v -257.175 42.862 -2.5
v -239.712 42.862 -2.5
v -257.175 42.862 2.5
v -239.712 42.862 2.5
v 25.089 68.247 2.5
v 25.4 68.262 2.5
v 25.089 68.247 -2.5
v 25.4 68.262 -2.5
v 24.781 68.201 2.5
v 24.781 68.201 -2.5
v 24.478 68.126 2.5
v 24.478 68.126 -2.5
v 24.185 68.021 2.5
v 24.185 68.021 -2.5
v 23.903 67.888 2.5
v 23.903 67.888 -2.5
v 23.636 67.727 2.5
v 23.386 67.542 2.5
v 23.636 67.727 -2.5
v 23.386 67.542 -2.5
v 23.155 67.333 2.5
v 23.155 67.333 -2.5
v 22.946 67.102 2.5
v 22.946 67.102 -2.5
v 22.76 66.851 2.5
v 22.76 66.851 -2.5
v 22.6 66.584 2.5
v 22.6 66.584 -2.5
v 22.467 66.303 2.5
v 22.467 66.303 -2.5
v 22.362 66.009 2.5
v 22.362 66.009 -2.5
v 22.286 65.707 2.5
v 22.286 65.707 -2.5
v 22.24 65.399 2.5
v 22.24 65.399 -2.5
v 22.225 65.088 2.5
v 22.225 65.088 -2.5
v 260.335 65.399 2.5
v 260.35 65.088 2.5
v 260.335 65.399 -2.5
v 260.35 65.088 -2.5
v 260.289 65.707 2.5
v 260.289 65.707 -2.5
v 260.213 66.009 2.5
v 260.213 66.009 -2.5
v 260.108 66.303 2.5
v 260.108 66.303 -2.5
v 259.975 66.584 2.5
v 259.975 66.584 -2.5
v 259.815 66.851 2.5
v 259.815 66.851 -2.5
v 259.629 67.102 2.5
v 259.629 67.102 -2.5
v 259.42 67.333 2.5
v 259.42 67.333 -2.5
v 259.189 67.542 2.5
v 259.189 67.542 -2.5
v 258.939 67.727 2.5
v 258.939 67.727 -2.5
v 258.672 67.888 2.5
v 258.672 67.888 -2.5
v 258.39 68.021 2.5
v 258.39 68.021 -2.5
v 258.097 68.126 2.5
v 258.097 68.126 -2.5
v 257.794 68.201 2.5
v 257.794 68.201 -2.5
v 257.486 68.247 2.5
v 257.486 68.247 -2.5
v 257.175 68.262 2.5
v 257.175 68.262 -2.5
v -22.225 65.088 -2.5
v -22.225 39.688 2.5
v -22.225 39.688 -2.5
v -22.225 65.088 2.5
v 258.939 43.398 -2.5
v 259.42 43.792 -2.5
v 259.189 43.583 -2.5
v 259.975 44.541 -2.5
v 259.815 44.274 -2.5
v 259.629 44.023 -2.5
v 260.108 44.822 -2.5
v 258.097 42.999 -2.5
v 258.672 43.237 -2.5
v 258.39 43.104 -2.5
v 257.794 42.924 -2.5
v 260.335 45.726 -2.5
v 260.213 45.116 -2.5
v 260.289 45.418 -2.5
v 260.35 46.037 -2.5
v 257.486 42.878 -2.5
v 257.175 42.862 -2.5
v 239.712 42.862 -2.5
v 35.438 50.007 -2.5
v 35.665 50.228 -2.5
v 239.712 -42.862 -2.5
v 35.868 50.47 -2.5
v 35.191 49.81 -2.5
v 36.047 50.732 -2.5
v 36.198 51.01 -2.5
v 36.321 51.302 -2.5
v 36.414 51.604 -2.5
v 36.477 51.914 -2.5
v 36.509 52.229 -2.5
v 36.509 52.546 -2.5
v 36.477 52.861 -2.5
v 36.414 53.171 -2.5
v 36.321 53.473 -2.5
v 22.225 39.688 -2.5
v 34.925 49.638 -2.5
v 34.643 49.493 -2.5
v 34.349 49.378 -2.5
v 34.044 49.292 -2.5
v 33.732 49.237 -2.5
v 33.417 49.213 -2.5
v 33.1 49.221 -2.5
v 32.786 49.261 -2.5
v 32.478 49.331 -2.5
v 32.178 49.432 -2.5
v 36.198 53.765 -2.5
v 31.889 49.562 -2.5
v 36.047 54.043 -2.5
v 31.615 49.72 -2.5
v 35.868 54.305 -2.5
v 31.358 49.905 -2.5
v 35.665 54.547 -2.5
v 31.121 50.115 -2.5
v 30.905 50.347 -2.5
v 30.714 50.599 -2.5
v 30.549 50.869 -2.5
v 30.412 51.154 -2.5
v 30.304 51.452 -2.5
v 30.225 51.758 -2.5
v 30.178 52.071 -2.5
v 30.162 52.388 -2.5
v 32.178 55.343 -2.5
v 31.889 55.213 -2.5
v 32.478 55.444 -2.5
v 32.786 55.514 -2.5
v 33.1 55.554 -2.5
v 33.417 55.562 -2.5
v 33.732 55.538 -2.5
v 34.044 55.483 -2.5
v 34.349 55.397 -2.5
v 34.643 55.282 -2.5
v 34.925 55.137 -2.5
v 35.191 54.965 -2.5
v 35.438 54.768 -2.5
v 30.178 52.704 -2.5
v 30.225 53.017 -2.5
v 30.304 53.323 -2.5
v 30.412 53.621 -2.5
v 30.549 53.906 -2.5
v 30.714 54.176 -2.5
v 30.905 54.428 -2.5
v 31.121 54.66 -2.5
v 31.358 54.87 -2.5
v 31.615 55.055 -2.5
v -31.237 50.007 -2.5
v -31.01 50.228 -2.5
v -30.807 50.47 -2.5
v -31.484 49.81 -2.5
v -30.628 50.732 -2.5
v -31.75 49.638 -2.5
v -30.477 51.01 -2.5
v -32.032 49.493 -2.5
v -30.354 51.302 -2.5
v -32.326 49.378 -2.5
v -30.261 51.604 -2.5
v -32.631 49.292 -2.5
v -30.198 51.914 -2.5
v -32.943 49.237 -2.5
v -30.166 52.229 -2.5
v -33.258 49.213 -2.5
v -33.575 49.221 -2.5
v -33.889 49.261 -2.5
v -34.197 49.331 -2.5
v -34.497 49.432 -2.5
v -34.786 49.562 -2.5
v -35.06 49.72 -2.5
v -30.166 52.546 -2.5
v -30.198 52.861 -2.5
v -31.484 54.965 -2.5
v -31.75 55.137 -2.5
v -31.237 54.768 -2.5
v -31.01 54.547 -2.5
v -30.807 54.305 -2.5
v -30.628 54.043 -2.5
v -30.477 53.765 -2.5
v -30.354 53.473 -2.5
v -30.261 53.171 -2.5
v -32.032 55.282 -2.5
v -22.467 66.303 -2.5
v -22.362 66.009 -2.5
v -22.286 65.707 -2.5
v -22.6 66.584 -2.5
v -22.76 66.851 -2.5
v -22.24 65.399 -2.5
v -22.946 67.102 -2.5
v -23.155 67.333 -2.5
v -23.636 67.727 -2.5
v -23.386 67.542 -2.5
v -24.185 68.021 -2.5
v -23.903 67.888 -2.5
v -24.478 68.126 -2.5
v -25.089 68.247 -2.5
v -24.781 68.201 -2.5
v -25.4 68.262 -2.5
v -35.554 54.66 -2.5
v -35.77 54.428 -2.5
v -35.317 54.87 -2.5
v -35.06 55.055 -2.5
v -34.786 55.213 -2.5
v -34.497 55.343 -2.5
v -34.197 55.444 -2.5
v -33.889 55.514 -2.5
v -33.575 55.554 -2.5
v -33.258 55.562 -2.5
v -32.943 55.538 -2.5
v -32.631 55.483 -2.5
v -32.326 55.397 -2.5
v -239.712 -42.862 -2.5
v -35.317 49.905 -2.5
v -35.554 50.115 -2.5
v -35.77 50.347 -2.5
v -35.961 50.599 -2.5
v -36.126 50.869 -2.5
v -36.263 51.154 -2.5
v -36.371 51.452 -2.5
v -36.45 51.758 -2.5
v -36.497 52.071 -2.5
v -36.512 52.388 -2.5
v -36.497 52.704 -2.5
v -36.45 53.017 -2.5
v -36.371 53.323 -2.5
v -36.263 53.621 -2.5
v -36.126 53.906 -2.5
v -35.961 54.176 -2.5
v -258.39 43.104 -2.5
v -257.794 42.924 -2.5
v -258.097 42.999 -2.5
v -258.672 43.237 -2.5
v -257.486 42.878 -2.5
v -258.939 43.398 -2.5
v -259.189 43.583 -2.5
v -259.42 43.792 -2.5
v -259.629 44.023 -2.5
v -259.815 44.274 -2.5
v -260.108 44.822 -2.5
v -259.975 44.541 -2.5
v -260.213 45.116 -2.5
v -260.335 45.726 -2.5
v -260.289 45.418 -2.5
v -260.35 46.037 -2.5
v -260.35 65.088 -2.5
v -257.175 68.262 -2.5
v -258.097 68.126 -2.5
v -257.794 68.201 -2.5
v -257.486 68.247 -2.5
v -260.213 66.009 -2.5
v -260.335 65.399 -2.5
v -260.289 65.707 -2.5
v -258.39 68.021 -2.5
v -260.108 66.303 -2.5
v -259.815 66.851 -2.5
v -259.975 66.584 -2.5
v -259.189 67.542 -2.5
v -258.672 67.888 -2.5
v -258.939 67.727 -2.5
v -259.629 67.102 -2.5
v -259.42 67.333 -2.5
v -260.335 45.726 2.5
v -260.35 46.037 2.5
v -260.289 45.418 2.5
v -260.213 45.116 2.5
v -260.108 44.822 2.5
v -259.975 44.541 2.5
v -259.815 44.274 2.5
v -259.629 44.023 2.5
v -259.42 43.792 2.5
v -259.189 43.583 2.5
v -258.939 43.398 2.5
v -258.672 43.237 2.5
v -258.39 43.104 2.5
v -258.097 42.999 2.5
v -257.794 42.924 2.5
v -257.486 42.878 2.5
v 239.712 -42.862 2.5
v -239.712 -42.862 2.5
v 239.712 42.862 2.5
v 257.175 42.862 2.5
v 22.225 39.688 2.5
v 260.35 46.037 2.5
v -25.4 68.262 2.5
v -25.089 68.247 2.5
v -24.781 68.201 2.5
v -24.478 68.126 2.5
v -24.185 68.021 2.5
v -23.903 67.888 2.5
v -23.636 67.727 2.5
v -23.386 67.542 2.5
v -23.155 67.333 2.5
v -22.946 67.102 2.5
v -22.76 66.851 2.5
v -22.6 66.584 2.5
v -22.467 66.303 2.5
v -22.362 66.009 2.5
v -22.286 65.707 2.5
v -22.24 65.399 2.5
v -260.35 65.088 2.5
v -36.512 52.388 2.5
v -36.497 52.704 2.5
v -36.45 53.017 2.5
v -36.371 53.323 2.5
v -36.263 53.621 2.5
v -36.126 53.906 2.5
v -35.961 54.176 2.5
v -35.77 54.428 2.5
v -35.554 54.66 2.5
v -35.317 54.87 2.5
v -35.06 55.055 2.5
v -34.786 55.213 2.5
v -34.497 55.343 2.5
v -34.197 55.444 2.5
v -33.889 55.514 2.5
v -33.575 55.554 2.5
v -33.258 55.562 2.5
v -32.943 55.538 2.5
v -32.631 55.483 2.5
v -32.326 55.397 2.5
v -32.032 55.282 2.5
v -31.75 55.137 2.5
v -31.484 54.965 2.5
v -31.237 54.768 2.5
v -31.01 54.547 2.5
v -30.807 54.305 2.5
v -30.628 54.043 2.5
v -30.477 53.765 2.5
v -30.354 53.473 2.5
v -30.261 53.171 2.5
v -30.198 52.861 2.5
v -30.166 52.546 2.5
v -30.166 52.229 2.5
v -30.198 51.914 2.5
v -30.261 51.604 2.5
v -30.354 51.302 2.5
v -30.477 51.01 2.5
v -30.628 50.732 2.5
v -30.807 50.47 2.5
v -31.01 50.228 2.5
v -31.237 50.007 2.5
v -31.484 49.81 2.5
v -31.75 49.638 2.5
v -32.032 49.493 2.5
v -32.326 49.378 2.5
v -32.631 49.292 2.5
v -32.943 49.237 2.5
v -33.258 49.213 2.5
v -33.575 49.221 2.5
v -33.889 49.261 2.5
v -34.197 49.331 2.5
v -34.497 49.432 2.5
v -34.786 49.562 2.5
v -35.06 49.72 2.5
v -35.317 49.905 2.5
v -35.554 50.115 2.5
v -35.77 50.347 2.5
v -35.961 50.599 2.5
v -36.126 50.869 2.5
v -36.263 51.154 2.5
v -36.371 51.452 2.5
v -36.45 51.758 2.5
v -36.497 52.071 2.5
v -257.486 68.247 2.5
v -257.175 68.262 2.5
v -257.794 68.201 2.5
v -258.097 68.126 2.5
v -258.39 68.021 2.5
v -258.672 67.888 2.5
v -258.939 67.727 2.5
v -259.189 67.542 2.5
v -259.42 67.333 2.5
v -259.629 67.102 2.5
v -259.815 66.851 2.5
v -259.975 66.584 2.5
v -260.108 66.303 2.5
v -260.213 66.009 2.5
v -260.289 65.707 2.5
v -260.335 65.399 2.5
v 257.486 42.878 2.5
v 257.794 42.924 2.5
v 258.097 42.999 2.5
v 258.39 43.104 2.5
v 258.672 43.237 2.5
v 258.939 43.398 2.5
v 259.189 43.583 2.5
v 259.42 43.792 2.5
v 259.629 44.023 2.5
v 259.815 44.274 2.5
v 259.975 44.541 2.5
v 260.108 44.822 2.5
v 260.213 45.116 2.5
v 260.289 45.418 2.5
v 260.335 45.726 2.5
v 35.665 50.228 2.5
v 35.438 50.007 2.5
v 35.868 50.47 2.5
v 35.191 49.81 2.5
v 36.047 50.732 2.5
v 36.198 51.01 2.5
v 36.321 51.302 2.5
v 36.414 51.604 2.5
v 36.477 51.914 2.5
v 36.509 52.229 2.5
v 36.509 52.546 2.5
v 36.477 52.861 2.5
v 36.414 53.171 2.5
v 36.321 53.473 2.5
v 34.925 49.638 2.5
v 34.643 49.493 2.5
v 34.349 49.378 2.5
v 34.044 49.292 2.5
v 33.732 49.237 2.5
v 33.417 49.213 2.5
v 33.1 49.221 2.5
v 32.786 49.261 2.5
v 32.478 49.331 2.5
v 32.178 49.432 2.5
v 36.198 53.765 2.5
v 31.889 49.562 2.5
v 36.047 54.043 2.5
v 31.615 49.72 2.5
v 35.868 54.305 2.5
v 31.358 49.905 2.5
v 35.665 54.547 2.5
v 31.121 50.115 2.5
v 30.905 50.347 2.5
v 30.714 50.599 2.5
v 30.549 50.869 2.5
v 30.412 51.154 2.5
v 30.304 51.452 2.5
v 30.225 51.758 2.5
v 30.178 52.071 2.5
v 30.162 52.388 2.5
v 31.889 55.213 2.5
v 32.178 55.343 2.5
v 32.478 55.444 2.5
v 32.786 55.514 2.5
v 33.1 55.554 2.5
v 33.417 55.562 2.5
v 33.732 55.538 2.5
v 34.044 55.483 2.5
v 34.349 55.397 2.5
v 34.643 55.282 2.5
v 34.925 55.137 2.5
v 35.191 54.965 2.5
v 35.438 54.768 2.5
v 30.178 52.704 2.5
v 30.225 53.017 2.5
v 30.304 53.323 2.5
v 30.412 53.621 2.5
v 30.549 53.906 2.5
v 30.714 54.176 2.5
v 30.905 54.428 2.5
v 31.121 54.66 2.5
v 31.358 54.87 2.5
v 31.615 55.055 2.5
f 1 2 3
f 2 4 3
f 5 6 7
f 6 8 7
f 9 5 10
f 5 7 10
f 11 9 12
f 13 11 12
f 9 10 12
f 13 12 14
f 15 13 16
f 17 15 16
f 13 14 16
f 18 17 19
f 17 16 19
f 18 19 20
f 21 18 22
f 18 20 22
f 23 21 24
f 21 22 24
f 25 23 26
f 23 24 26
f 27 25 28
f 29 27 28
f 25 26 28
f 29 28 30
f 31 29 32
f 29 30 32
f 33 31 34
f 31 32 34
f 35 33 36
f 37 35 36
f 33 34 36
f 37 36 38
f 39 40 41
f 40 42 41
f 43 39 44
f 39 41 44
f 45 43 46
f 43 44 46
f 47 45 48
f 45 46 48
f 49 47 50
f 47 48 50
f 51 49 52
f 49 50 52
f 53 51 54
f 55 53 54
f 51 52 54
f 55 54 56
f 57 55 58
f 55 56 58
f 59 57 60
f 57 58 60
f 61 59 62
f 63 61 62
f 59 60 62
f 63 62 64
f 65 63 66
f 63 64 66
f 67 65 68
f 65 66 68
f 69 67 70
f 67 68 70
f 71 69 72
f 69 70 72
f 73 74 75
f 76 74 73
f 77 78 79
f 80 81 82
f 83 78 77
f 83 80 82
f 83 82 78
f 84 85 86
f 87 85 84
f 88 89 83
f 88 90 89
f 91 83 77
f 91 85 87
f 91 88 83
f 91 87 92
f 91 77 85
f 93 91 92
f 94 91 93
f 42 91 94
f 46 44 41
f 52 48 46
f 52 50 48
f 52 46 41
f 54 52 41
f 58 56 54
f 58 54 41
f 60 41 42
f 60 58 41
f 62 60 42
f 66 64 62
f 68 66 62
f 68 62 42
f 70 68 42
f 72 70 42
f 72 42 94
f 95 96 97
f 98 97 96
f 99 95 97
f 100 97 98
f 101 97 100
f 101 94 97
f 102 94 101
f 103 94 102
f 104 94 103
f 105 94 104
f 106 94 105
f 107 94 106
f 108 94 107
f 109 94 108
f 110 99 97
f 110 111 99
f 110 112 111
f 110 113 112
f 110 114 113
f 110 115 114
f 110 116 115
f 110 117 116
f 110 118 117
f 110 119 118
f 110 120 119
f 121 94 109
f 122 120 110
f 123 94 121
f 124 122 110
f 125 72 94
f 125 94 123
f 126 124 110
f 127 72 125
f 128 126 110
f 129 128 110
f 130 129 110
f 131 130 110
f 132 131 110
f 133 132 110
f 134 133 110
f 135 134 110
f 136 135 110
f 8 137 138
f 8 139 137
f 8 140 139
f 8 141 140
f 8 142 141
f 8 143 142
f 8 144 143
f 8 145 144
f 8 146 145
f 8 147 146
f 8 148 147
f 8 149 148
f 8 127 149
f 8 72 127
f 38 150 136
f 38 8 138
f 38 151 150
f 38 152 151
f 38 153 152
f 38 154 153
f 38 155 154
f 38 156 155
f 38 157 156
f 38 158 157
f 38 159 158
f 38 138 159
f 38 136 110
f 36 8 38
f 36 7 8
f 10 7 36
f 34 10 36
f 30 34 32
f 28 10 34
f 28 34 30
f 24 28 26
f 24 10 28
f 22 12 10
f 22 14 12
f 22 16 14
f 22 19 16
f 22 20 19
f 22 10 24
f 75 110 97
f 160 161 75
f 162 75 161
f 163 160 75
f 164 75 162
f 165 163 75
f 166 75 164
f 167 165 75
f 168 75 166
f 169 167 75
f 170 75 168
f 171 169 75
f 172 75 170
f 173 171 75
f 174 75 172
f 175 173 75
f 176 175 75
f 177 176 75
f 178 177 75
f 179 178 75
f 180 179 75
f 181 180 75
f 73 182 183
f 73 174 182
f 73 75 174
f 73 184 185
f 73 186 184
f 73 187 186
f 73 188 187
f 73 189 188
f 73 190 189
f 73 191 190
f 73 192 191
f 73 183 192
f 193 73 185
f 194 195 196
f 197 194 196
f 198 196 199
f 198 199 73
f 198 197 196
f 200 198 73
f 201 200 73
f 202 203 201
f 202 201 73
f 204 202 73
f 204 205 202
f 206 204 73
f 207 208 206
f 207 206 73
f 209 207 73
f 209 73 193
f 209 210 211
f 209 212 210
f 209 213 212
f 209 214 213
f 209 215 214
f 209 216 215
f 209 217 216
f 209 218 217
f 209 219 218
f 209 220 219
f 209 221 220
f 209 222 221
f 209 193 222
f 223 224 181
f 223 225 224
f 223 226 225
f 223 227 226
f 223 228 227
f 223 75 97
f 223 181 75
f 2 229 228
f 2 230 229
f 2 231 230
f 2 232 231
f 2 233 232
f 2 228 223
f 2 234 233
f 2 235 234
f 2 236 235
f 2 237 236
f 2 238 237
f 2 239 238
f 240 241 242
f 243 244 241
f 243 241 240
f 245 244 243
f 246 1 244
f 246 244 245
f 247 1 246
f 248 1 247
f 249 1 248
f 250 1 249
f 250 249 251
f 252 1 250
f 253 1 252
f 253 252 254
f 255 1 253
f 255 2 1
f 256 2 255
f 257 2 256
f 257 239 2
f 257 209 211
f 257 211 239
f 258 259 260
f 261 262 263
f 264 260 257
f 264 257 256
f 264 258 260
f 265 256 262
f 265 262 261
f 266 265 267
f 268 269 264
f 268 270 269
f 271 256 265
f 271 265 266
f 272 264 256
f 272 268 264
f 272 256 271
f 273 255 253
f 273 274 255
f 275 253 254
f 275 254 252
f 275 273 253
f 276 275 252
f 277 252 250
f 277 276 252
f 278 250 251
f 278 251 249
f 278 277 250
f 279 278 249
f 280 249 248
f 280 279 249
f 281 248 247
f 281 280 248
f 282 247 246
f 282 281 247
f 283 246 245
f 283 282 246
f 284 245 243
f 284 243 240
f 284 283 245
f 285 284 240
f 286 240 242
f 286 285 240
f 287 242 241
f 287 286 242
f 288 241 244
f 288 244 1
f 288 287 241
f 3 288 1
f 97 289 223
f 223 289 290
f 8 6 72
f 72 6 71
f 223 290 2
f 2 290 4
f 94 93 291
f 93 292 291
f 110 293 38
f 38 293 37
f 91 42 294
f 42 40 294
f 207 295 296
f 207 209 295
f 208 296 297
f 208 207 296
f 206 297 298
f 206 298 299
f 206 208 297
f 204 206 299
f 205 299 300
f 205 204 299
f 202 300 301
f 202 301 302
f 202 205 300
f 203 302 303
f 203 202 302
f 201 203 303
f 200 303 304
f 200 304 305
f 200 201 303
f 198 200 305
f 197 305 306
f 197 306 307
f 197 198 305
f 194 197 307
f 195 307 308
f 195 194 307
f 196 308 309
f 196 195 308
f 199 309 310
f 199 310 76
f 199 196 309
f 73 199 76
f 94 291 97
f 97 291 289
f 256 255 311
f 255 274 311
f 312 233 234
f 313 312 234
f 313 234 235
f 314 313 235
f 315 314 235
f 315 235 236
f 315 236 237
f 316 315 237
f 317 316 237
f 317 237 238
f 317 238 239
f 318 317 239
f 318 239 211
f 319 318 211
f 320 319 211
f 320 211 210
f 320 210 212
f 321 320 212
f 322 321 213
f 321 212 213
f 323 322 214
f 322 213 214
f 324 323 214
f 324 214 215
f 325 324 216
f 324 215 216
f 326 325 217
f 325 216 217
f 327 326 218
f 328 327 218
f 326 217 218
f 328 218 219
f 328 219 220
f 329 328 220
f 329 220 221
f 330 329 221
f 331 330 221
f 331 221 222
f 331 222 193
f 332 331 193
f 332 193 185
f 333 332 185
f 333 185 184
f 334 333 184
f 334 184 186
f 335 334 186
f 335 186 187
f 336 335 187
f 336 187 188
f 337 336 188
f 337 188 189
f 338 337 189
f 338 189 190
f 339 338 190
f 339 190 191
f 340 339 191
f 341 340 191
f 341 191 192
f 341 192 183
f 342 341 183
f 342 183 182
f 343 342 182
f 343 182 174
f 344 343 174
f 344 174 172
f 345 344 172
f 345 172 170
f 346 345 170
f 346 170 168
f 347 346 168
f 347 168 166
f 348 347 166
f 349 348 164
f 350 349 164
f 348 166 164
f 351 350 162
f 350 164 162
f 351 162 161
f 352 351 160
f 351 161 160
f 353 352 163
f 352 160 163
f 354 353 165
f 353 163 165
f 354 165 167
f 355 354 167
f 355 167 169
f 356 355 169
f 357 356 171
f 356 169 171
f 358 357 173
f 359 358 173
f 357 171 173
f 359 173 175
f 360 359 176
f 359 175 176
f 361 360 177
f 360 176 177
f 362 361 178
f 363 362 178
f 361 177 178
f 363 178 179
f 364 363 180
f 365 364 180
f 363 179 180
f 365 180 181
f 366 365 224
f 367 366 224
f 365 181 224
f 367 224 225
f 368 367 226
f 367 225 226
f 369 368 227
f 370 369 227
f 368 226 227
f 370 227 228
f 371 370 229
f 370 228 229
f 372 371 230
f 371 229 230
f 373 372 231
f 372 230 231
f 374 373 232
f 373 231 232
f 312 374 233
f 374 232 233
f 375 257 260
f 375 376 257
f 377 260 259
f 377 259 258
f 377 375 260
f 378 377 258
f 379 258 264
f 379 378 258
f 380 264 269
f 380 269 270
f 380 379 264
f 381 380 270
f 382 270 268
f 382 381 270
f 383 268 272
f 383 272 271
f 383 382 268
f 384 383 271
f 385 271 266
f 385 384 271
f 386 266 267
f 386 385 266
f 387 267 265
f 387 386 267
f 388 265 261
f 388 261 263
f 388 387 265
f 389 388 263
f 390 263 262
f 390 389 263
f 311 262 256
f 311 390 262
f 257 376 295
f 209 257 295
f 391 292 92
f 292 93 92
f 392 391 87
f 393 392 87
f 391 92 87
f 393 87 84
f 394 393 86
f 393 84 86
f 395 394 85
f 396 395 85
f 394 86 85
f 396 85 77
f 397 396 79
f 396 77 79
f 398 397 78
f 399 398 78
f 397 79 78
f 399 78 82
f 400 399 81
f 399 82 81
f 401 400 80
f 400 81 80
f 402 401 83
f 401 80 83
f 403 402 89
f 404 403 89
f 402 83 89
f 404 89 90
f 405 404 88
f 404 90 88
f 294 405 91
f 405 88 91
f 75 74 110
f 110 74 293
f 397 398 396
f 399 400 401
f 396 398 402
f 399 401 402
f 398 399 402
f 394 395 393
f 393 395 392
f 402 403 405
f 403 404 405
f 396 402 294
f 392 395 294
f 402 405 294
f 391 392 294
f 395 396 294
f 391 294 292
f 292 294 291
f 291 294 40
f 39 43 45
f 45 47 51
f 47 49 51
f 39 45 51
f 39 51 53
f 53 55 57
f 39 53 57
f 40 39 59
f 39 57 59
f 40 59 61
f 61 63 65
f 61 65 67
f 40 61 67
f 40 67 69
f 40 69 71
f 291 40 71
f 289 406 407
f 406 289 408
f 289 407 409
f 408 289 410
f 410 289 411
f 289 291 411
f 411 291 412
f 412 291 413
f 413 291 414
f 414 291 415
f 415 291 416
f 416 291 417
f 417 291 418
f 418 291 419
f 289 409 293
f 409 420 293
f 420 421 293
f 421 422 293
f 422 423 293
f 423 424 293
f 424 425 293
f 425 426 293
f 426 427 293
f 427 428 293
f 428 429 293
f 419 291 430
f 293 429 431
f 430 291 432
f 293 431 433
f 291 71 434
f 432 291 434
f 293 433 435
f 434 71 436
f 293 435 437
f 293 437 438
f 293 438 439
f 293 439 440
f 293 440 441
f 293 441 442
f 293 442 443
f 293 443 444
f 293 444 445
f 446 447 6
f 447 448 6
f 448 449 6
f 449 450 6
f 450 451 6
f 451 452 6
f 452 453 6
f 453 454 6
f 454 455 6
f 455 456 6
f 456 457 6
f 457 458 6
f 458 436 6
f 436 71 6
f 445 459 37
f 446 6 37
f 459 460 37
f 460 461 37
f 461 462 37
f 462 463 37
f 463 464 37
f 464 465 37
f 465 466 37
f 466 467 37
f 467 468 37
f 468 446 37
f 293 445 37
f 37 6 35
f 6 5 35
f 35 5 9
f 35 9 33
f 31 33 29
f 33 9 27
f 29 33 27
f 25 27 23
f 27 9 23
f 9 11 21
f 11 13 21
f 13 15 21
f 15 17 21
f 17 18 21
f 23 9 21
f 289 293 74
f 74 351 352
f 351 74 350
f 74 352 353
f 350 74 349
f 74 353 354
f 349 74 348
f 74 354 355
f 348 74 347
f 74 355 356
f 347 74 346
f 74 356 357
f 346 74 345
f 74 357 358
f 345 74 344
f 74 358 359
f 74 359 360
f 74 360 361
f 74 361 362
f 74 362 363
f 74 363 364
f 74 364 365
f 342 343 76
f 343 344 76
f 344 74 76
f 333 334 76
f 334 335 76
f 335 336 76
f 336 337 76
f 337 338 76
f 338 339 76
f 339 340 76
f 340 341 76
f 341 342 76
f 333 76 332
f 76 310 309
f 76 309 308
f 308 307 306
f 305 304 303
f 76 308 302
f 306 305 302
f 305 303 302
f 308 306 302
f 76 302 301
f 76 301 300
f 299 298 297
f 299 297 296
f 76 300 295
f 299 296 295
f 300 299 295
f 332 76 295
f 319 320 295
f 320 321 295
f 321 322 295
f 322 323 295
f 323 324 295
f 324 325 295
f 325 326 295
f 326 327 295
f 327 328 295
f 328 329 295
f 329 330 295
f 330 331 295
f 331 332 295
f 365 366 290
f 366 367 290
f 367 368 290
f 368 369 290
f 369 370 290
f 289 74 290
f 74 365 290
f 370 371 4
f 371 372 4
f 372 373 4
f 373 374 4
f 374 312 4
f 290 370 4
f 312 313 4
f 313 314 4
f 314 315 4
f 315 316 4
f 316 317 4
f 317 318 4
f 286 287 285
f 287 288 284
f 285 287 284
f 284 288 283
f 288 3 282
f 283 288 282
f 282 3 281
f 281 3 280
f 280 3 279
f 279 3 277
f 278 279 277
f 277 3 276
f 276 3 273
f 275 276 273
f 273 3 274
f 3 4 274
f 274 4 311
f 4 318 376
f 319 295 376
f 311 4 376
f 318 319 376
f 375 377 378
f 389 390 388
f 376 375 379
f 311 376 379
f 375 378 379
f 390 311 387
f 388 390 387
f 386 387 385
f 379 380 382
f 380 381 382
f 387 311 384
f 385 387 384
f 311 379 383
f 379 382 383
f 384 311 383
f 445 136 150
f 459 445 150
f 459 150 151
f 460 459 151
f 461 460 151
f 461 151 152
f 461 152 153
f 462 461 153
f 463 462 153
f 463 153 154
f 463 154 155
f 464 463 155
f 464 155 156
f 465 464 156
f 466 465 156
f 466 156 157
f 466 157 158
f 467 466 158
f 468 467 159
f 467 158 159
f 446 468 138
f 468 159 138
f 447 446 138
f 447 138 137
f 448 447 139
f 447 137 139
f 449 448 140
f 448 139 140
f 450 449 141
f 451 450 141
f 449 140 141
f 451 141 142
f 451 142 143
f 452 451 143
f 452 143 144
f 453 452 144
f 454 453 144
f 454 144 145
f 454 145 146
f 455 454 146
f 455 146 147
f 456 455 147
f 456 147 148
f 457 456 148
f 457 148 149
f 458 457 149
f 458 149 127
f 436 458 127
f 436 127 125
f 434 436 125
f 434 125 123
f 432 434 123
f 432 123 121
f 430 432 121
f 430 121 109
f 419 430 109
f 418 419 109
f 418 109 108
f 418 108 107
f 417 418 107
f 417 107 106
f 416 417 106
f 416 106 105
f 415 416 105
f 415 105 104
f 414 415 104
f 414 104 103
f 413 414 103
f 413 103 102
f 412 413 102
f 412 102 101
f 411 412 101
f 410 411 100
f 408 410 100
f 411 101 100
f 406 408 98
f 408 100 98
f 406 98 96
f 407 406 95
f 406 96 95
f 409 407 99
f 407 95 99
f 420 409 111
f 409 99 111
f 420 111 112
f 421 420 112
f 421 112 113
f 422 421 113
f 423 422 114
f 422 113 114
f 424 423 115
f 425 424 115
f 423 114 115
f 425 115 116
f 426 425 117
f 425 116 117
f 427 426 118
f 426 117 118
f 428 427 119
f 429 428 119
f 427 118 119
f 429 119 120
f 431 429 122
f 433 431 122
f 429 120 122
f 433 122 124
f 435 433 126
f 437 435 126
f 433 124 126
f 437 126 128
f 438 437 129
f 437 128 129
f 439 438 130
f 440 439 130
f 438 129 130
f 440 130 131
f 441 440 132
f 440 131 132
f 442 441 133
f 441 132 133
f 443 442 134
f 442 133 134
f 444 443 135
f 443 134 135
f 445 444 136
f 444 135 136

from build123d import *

# Parameters (mm, degrees)
BOSS_EXTRUDE1_DEPTH         = 2.5
SKETCH2_W                   = 44.45
SKETCH2_H                   = 28.575
CUT_EXTRUDE1_DEPTH          = 270.196752221
FILLET1_R                   = 3.175
F_1_4_0_25_DIAMETER_HOLE1_D = 6.35


with BuildPart() as part:
    # Sketch1 → Boss-Extrude1 (new, symmetric)
    with BuildSketch(Plane.XY):
        Polygon((-260.35, 68.2625), (260.35, 68.2625), (260.35, 42.8625), (239.7125, 42.8625), (239.7125, -42.8625), (-239.7125, -42.8625), (-239.7125, 42.8625), (-260.35, 42.8625), align=None)
    extrude(amount=BOSS_EXTRUDE1_DEPTH, both=True)

    # Sketch2 → Cut-Extrude1 (cut, through all)
    with BuildSketch(Plane.XY.offset(2.5)):
        with Locations((0, 53.975)):
            Rectangle(SKETCH2_W, SKETCH2_H)
    extrude(amount=-CUT_EXTRUDE1_DEPTH, mode=Mode.SUBTRACT)

    # Fillet1
    fillet1_edges = [part.edges().sort_by_distance(p)[0] for p in [
        (-260.35, 68.2625, 0),
        (260.35, 68.2625, 0),
        (260.35, 42.8625, 0),
        (-260.35, 42.8625, 0),
        (22.225, 68.2625, 0),
        (-22.225, 68.2625, 0),
    ]]
    fillet(fillet1_edges, radius=FILLET1_R)

    # 1/4 (0.25) Diameter Hole1 (through all)
    with Locations(Plane.XY.offset(2.5)):
        with Locations((-33.3375, 52.3875), (33.3375, 52.3875)):
            Hole(F_1_4_0_25_DIAMETER_HOLE1_D / 2)


solid = part.part
